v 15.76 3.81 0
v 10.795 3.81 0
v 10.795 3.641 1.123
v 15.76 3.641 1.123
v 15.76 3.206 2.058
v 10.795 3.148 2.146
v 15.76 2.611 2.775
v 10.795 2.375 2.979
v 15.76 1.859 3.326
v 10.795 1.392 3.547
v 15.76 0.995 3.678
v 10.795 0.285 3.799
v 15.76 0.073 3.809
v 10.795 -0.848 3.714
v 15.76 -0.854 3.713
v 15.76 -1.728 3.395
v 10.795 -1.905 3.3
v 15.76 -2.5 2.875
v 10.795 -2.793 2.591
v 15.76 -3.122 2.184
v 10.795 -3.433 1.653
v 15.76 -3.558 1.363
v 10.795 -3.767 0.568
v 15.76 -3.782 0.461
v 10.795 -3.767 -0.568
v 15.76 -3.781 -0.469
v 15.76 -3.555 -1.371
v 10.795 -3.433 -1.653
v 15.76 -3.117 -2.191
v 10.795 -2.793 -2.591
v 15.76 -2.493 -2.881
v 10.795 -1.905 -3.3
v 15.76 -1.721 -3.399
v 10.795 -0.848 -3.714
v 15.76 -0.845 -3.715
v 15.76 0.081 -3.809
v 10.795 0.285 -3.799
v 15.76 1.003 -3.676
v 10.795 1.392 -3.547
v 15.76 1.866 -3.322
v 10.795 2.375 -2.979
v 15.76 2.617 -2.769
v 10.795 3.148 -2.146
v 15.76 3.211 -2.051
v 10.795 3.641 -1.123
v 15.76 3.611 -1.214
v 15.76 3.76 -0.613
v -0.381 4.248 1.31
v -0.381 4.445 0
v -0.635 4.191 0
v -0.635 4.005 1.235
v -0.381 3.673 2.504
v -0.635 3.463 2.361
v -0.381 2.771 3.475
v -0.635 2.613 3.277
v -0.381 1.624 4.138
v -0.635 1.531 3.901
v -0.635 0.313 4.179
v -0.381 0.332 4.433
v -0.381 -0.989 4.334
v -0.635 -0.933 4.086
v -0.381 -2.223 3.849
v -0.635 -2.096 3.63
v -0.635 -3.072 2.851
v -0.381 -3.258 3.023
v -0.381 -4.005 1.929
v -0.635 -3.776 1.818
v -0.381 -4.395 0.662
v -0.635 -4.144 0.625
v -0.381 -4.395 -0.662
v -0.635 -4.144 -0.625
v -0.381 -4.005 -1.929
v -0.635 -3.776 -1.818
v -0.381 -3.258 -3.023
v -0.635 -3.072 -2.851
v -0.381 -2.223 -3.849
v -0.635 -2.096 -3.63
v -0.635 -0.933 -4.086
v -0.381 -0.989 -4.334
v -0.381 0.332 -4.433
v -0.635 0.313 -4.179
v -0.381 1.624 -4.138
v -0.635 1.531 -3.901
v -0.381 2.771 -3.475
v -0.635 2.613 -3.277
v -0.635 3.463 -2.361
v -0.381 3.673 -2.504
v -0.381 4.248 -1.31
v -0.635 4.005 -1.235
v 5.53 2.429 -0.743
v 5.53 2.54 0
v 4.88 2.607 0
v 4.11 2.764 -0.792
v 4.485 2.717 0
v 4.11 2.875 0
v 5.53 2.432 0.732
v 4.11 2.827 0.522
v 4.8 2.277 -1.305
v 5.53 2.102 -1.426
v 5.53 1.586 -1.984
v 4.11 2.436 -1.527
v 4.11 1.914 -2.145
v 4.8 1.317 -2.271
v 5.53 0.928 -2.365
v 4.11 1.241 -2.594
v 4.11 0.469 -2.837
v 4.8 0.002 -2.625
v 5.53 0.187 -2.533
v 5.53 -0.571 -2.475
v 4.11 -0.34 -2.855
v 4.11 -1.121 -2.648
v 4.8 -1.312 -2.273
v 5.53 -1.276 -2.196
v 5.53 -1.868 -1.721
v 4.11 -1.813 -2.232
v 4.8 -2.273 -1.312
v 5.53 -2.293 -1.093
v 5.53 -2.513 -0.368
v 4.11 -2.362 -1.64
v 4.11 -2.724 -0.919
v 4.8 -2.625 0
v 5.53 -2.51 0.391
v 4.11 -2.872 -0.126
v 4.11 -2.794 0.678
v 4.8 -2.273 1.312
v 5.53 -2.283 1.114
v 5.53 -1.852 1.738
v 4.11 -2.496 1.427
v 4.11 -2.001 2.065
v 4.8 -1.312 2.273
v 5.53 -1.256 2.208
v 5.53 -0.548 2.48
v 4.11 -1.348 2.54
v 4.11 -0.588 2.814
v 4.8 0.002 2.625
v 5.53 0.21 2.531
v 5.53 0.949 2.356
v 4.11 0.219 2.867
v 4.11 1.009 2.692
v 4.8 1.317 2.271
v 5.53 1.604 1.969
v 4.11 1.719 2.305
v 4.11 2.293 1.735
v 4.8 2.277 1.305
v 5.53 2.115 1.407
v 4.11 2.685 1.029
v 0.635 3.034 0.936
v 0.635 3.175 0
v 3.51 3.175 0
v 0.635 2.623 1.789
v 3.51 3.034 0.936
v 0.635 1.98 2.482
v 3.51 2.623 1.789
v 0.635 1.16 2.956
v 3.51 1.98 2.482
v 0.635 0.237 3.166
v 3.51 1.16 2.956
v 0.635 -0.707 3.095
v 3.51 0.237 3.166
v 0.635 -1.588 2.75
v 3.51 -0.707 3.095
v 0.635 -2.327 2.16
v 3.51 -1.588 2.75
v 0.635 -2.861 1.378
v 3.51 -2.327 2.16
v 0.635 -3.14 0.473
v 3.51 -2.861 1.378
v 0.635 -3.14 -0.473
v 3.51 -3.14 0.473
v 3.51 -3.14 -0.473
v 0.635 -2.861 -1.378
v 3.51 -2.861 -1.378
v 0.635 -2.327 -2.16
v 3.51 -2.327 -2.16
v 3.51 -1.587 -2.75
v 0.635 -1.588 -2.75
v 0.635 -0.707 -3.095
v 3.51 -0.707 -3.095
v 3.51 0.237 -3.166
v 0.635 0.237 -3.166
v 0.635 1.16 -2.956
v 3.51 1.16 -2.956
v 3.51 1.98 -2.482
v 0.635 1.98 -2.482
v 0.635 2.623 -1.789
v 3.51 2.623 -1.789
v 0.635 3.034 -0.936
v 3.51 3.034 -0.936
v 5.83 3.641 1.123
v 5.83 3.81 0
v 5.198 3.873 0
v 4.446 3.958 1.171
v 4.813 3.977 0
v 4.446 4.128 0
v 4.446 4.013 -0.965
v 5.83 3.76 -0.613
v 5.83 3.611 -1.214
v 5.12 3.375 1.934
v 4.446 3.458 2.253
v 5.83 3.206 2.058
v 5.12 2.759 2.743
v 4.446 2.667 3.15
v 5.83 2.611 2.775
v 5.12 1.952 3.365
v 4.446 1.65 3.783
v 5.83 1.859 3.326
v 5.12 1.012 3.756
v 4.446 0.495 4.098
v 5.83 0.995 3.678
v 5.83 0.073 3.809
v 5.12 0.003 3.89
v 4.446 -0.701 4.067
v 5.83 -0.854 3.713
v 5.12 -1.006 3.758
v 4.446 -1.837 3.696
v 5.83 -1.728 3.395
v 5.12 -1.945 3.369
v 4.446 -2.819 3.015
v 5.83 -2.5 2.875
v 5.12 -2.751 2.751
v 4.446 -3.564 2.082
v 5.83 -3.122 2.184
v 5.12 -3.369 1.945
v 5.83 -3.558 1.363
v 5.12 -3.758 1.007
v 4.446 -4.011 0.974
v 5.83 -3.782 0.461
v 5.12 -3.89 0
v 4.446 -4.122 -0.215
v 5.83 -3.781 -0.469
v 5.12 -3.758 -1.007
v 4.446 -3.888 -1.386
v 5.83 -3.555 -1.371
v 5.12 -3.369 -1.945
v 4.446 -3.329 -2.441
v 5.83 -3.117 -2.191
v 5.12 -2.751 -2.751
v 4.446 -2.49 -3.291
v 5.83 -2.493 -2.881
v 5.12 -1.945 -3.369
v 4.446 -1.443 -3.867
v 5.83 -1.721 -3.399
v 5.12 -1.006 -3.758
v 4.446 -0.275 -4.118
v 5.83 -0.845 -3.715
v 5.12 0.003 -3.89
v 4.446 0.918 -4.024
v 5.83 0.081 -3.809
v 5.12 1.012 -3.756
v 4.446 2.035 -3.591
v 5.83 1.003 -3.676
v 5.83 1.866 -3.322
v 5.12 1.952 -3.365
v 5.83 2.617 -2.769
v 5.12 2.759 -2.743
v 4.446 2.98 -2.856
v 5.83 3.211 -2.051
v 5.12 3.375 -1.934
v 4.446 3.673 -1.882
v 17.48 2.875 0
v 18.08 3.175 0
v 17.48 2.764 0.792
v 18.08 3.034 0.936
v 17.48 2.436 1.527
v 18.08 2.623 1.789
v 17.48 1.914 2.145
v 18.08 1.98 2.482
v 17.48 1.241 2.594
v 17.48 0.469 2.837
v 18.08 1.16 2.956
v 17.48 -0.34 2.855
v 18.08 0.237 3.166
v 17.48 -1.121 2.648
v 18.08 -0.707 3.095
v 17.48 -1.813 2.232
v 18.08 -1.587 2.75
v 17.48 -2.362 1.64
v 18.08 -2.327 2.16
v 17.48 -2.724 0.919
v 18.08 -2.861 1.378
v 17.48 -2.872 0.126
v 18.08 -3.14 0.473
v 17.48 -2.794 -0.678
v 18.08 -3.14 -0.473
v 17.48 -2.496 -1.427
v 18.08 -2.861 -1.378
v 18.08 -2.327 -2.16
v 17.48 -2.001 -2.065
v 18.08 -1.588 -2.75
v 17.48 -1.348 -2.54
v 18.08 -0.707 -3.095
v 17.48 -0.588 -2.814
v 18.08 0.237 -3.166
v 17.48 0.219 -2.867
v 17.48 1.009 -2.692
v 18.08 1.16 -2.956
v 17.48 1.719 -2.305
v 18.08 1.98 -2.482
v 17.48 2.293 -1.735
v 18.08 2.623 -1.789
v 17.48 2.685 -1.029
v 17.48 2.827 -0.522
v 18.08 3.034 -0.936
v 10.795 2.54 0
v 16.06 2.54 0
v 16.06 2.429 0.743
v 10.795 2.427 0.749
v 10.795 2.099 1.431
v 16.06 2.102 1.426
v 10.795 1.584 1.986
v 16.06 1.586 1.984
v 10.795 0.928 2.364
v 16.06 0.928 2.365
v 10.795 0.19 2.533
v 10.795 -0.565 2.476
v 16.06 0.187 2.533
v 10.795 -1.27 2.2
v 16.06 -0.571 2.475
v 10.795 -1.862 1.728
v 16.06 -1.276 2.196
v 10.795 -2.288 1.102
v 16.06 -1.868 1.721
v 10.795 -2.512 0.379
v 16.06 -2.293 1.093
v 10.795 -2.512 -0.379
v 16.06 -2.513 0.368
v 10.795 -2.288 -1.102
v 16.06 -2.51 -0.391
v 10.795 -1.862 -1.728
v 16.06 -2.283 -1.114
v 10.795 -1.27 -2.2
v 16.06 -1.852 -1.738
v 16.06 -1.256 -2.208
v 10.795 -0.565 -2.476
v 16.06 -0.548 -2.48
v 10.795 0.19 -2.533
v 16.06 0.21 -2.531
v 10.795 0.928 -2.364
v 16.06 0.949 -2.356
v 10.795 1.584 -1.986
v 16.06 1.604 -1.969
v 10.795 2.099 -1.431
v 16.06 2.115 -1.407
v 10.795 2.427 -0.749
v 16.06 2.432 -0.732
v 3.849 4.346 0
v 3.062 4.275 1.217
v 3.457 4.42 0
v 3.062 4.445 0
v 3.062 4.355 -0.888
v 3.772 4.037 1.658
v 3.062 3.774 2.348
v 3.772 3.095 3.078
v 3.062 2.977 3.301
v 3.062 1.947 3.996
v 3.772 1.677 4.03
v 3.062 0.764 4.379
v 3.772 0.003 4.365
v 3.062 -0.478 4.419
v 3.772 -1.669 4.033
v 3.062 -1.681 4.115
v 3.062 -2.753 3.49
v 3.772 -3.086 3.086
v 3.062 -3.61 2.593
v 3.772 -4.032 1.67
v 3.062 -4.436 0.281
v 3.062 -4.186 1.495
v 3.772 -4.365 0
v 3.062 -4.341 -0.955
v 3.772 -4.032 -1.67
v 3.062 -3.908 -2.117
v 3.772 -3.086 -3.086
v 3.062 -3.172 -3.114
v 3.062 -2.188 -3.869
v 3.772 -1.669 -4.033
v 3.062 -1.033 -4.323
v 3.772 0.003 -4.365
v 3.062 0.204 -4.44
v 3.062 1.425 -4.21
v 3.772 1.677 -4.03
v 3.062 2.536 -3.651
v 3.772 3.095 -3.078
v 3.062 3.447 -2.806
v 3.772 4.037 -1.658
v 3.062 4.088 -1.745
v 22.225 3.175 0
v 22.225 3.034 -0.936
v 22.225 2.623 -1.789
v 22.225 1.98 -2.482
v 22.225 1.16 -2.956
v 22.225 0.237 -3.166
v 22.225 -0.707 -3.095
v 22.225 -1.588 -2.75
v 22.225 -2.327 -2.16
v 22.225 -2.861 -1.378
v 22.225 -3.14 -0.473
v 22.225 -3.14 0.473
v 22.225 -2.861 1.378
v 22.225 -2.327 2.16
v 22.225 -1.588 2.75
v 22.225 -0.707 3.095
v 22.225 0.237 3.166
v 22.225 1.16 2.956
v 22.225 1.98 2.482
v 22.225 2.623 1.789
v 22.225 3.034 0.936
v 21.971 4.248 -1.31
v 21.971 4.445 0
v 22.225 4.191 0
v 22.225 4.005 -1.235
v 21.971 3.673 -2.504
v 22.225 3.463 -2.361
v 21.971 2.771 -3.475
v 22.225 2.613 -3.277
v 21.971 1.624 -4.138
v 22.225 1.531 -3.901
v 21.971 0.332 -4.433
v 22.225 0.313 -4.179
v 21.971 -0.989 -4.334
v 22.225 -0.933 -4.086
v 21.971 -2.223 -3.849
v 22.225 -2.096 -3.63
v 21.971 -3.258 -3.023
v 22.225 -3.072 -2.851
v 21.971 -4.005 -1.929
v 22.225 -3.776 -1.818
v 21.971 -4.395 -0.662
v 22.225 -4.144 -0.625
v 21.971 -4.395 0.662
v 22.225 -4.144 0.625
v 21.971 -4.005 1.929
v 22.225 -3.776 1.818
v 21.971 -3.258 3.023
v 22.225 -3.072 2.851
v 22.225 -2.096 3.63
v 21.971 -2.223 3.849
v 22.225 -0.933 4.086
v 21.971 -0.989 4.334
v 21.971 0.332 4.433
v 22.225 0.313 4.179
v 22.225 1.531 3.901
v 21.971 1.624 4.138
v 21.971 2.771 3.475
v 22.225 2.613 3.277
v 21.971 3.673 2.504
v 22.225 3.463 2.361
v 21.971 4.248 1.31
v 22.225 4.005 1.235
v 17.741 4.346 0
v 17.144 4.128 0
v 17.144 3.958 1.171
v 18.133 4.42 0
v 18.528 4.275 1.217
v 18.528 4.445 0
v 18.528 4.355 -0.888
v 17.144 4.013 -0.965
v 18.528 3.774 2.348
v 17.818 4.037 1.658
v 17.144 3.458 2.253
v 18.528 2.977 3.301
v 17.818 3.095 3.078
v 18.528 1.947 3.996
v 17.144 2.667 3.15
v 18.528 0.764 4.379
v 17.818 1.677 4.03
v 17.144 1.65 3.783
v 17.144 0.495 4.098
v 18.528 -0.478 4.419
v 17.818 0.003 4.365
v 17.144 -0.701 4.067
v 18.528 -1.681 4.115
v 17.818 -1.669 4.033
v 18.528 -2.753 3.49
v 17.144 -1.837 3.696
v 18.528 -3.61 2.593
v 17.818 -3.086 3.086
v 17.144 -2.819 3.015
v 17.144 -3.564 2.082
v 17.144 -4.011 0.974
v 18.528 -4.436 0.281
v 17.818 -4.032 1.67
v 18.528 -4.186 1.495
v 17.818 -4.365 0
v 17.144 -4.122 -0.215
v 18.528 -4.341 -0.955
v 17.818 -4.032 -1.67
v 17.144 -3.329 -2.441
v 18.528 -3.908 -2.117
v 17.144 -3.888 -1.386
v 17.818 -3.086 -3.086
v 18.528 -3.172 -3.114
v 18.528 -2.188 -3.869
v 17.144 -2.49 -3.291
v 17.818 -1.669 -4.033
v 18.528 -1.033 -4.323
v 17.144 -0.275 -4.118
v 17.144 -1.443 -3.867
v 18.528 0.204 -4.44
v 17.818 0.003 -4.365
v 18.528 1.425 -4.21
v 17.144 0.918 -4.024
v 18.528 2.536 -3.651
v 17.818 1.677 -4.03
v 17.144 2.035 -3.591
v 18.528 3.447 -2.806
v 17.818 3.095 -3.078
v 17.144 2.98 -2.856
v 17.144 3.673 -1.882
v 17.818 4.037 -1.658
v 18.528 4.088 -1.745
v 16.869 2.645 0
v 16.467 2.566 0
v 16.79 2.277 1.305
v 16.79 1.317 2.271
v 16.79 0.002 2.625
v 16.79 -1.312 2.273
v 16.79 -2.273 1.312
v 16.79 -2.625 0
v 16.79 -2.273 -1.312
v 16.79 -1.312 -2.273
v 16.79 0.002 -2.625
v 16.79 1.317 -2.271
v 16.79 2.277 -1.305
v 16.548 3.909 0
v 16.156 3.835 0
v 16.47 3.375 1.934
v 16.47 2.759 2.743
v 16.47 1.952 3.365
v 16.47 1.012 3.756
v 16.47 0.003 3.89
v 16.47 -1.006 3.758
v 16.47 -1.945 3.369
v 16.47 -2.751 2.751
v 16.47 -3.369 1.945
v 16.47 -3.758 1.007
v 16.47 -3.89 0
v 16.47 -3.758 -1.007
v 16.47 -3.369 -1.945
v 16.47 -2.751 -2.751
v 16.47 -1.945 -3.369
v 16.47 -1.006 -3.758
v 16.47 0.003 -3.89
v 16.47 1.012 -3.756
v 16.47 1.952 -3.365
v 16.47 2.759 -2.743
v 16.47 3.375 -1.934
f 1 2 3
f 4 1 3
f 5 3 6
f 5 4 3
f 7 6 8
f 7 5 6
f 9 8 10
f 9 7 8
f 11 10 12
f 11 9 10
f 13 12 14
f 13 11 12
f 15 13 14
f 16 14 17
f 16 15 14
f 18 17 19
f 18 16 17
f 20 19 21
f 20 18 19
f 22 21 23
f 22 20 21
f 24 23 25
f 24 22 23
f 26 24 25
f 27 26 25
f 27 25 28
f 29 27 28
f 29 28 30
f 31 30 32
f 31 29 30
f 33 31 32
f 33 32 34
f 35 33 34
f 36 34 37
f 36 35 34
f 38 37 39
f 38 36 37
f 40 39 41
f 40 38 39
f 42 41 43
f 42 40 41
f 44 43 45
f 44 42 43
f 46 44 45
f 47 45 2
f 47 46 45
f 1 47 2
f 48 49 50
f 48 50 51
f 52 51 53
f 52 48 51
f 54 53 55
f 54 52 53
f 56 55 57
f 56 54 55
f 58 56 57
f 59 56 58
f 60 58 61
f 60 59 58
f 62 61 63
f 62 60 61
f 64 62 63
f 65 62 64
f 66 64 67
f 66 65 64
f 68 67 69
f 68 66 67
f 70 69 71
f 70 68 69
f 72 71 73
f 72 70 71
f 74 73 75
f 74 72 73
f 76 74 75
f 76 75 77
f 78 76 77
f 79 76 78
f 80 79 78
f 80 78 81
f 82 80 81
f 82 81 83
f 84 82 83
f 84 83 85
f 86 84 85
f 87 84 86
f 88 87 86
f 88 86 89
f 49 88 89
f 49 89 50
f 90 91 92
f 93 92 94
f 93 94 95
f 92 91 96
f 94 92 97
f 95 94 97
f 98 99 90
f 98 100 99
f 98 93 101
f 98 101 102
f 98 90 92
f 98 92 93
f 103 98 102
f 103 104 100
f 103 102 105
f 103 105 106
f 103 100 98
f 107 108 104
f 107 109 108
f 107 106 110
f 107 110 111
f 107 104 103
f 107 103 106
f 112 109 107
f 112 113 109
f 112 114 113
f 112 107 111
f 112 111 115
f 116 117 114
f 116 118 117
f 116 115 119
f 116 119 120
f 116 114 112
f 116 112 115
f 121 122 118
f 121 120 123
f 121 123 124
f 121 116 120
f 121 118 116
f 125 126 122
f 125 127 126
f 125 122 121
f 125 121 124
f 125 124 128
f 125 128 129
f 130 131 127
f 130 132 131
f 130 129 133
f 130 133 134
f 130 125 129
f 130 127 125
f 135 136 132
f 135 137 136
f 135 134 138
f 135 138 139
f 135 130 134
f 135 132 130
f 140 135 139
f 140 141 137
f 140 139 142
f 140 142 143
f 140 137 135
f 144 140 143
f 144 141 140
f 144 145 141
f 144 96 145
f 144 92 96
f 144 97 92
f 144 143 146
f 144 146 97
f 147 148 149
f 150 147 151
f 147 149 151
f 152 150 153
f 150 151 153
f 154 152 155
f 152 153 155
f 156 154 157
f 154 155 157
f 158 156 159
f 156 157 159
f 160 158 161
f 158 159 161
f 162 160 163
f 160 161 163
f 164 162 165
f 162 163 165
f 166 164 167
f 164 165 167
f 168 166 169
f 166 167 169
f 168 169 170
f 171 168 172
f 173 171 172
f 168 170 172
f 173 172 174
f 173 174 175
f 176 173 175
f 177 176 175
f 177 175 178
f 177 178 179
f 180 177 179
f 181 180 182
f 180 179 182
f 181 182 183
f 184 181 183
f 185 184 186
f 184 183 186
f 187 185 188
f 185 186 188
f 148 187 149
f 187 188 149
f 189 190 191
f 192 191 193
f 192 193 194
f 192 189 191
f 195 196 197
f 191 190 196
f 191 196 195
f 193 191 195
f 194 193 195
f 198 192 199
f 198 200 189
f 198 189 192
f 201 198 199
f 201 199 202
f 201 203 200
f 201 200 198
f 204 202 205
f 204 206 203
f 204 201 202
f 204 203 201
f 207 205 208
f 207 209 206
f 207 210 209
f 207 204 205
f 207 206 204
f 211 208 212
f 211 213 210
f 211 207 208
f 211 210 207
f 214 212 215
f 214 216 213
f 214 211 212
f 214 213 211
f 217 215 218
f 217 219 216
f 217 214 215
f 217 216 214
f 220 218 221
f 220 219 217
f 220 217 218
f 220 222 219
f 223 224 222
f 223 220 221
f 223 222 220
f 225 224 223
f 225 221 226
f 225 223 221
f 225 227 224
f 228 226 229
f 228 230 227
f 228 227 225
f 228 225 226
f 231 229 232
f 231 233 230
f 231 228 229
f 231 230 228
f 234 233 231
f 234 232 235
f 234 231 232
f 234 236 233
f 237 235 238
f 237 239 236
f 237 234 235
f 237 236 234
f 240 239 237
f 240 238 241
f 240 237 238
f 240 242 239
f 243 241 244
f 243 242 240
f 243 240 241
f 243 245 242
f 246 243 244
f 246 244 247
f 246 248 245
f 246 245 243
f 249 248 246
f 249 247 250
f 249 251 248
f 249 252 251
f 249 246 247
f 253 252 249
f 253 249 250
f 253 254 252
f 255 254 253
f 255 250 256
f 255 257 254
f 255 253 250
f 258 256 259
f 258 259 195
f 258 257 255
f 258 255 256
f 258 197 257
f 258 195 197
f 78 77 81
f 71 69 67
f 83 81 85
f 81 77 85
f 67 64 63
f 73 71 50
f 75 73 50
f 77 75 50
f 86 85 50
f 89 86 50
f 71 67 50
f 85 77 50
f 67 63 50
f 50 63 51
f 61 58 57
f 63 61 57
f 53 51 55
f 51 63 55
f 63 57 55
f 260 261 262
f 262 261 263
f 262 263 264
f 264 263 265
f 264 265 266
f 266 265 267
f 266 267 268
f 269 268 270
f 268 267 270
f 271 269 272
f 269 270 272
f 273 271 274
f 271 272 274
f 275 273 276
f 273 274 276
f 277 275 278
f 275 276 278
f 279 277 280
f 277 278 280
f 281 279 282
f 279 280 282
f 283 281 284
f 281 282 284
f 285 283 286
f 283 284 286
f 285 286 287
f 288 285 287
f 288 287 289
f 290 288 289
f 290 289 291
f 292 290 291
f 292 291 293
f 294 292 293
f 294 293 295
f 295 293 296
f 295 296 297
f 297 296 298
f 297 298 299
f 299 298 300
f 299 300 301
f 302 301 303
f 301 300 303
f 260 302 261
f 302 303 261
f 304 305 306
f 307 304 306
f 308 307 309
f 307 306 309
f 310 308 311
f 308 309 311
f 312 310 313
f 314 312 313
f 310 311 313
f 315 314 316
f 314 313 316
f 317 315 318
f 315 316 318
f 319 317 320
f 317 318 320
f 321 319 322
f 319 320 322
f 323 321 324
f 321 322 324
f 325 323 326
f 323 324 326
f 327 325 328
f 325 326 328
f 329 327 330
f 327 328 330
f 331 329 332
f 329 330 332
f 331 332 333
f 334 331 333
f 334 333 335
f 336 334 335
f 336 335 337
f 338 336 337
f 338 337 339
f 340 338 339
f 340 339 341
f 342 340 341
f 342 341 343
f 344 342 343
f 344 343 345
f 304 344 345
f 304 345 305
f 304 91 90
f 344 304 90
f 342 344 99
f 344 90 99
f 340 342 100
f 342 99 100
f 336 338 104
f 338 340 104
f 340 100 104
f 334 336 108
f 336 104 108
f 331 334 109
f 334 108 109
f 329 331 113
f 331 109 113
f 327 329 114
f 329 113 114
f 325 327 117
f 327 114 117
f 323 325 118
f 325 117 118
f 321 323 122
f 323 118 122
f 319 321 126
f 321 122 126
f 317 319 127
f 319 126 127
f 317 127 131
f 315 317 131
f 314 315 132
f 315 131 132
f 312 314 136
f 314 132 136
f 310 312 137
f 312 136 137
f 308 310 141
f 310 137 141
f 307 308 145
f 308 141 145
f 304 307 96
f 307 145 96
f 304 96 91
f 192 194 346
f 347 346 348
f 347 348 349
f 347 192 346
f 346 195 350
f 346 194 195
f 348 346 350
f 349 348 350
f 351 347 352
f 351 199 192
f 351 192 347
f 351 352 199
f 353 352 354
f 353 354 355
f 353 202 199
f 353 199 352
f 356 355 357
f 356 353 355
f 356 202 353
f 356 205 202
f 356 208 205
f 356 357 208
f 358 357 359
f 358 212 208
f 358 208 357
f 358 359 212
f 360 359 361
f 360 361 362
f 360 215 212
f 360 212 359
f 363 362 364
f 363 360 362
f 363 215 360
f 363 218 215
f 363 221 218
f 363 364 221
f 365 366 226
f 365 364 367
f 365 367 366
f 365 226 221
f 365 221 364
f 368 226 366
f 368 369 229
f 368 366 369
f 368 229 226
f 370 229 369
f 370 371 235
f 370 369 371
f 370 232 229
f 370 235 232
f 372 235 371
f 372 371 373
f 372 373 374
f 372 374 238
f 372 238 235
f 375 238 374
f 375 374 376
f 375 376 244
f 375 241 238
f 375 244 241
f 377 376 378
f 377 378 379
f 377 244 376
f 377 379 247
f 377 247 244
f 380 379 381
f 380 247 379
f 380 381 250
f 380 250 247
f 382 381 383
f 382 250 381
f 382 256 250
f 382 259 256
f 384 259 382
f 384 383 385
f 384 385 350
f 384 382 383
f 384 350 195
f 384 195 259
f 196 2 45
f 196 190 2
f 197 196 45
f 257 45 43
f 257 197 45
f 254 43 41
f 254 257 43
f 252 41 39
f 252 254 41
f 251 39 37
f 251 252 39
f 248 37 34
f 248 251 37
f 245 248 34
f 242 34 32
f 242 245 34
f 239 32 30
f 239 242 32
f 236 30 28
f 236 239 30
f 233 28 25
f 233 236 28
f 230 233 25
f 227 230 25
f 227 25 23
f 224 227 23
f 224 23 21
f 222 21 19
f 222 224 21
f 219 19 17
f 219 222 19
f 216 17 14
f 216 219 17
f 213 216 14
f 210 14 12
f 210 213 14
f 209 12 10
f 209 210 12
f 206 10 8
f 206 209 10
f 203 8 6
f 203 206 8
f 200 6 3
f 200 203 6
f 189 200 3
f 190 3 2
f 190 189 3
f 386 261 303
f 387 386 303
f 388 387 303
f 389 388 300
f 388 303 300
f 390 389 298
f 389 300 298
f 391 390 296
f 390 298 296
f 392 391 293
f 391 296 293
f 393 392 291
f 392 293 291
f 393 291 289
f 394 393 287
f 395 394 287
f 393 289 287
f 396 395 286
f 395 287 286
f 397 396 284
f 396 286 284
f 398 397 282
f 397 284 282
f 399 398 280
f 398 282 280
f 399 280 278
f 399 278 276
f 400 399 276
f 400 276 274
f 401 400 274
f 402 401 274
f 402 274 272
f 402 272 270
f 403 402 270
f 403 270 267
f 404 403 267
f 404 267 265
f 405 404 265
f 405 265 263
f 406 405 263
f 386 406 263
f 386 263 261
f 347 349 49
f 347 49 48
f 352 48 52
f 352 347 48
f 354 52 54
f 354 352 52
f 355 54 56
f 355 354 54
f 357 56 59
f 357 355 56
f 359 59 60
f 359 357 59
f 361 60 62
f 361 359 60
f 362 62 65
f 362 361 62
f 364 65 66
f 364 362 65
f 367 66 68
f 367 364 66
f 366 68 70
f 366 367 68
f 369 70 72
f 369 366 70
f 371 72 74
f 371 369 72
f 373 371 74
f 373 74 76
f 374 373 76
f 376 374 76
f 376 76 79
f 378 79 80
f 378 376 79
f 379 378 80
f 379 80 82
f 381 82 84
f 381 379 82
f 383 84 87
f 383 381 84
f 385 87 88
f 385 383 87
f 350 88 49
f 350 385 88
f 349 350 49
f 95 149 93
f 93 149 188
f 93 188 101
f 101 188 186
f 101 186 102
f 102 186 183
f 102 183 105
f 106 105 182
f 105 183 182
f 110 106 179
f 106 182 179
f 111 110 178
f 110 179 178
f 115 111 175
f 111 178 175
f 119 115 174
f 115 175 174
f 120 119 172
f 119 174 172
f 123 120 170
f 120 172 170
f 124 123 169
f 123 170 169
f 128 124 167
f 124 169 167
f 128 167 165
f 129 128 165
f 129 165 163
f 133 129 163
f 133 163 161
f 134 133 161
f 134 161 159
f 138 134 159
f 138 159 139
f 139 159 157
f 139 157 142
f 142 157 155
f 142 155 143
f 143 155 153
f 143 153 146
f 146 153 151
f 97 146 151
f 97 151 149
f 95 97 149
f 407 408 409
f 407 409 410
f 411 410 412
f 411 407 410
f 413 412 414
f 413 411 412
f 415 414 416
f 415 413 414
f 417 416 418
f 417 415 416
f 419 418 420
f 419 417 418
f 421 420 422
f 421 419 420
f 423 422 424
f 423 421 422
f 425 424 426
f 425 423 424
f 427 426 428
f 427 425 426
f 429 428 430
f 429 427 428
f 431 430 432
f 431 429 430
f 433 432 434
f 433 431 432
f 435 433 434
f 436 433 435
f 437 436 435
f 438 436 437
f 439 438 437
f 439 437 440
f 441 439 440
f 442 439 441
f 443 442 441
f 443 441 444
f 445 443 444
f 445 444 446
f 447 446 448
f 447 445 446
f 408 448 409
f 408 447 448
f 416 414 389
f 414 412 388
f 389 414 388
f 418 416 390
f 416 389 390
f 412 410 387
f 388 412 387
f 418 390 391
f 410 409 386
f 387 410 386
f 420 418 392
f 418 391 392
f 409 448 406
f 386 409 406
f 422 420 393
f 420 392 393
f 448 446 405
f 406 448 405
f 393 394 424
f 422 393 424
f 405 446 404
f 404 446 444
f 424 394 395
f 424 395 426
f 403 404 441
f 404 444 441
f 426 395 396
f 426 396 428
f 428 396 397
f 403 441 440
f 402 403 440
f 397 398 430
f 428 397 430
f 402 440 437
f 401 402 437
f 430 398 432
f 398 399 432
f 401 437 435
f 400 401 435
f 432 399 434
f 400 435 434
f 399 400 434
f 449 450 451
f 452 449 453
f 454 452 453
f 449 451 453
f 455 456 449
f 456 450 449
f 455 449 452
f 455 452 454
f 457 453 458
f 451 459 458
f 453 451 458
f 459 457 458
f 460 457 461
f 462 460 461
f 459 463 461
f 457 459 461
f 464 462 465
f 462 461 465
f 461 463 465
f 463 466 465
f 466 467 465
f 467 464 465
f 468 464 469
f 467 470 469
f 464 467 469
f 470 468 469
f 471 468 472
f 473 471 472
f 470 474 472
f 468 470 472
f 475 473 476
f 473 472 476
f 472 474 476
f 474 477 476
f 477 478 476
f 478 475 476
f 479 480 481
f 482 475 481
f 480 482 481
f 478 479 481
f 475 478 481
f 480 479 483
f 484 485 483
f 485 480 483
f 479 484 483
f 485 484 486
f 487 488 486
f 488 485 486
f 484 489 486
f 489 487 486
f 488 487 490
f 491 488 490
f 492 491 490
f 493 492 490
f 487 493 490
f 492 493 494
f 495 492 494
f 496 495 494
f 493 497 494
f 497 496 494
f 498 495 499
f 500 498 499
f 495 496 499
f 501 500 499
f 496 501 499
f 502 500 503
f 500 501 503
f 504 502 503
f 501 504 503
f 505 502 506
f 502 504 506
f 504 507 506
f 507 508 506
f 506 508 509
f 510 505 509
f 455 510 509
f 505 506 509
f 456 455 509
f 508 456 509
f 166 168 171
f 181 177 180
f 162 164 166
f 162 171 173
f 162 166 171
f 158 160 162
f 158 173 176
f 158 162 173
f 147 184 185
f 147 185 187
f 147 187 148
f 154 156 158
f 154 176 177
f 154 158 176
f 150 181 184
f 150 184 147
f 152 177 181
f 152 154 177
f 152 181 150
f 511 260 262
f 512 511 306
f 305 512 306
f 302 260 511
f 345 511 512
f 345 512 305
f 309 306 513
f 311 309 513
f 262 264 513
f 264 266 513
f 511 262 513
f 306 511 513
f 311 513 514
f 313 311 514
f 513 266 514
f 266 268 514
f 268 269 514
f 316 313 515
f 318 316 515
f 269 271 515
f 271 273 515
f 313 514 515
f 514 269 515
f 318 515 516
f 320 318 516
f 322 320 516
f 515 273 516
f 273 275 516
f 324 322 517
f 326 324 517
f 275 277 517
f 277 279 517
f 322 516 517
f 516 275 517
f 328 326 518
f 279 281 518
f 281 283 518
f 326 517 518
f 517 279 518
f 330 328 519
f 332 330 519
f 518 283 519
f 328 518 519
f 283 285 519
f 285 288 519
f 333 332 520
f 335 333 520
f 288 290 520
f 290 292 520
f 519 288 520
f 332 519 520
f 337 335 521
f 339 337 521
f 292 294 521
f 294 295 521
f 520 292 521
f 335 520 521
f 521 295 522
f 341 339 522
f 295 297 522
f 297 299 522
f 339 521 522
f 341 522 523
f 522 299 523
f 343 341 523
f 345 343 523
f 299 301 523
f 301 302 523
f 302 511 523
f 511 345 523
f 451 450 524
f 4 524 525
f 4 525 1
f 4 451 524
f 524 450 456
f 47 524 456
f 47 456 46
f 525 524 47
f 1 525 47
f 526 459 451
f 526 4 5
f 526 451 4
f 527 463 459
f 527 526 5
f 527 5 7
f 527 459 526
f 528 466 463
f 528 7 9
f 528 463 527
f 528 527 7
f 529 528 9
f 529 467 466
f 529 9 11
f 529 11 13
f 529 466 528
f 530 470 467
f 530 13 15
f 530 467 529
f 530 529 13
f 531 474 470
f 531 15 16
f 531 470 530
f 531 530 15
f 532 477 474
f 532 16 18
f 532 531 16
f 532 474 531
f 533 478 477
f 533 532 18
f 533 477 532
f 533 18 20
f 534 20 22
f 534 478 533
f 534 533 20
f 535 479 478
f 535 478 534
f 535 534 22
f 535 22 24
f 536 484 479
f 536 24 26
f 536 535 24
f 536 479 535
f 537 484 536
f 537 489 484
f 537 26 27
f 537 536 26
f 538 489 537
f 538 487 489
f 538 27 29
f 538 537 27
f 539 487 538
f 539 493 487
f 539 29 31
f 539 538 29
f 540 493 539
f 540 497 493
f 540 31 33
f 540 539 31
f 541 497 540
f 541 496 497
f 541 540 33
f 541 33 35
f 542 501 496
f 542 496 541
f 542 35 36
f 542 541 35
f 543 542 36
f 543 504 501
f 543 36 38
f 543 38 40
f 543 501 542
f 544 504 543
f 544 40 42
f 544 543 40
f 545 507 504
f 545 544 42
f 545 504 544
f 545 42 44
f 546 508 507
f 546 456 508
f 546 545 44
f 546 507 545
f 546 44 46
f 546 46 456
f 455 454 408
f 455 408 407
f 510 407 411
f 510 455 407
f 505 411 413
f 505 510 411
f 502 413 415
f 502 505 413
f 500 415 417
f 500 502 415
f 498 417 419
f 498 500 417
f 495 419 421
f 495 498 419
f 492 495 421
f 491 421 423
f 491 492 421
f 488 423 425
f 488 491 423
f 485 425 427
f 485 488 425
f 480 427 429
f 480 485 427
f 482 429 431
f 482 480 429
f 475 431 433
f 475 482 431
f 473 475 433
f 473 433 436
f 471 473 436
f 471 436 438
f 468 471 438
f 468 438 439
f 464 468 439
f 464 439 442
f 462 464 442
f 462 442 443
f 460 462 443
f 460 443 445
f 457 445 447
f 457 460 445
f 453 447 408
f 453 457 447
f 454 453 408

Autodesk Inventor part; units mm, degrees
ref_plane "XZ Plane" through (0, 0, 0) normal (0, 1, 0) x (-1, 0, 0)
ref_plane "Work Plane1" through (5.08, 0, 0) normal (1, 0, 0) x (0, 1, 0)
sketch "Sketch2" plane through (5.08, 0, 0) normal (1, 0, 0) x (0, 1, 0)
  circle A0 centre (0, 0) radius 3.81
  dimension "d2" = 7.62
extrude "Extrusion1" add sketch "Sketch2" along normal blind 5.715
ref_plane "Work Plane2" through (3.81, 0, 0) normal (1, 0, 0) x (0, 1, 0)
sketch "Sketch3" plane through (3.81, 0, 0) normal (1, 0, 0) x (0, 1, 0)
  circle A0 centre (0, 0) radius 4.445
  dimension "d6" = 8.89
loft "Loft1" add profiles "Sketch3" section 2 edges at (5.08, -3.81, 0)
extrude "Extrusion2" add sketch "Sketch3" against normal blind 4.445
mirror "Mirror1" about plane through (10.795, 0, 0) normal (1, 0, 0) of "Extrusion1", "Loft1", "Extrusion2"
shell "Shell1" thickness 1.27 removed faces 1 at (22.225, 1.6691, 0.6886)
fillet "Fillet1" radius 3.175 6 edges at (3.81, -4.445, 0) (5.08, -3.81, 0) (16.51, -3.81, 0) (17.78, -4.445, 0) (4.7802, -2.54, 0) (16.8098, -2.54, 0)
chamfer "Chamfer1" distance 0.254 angle 45 2 edges at (-0.635, -4.445, 0) (22.225, -4.445, 0)
properties part number "Axle-Connector"
